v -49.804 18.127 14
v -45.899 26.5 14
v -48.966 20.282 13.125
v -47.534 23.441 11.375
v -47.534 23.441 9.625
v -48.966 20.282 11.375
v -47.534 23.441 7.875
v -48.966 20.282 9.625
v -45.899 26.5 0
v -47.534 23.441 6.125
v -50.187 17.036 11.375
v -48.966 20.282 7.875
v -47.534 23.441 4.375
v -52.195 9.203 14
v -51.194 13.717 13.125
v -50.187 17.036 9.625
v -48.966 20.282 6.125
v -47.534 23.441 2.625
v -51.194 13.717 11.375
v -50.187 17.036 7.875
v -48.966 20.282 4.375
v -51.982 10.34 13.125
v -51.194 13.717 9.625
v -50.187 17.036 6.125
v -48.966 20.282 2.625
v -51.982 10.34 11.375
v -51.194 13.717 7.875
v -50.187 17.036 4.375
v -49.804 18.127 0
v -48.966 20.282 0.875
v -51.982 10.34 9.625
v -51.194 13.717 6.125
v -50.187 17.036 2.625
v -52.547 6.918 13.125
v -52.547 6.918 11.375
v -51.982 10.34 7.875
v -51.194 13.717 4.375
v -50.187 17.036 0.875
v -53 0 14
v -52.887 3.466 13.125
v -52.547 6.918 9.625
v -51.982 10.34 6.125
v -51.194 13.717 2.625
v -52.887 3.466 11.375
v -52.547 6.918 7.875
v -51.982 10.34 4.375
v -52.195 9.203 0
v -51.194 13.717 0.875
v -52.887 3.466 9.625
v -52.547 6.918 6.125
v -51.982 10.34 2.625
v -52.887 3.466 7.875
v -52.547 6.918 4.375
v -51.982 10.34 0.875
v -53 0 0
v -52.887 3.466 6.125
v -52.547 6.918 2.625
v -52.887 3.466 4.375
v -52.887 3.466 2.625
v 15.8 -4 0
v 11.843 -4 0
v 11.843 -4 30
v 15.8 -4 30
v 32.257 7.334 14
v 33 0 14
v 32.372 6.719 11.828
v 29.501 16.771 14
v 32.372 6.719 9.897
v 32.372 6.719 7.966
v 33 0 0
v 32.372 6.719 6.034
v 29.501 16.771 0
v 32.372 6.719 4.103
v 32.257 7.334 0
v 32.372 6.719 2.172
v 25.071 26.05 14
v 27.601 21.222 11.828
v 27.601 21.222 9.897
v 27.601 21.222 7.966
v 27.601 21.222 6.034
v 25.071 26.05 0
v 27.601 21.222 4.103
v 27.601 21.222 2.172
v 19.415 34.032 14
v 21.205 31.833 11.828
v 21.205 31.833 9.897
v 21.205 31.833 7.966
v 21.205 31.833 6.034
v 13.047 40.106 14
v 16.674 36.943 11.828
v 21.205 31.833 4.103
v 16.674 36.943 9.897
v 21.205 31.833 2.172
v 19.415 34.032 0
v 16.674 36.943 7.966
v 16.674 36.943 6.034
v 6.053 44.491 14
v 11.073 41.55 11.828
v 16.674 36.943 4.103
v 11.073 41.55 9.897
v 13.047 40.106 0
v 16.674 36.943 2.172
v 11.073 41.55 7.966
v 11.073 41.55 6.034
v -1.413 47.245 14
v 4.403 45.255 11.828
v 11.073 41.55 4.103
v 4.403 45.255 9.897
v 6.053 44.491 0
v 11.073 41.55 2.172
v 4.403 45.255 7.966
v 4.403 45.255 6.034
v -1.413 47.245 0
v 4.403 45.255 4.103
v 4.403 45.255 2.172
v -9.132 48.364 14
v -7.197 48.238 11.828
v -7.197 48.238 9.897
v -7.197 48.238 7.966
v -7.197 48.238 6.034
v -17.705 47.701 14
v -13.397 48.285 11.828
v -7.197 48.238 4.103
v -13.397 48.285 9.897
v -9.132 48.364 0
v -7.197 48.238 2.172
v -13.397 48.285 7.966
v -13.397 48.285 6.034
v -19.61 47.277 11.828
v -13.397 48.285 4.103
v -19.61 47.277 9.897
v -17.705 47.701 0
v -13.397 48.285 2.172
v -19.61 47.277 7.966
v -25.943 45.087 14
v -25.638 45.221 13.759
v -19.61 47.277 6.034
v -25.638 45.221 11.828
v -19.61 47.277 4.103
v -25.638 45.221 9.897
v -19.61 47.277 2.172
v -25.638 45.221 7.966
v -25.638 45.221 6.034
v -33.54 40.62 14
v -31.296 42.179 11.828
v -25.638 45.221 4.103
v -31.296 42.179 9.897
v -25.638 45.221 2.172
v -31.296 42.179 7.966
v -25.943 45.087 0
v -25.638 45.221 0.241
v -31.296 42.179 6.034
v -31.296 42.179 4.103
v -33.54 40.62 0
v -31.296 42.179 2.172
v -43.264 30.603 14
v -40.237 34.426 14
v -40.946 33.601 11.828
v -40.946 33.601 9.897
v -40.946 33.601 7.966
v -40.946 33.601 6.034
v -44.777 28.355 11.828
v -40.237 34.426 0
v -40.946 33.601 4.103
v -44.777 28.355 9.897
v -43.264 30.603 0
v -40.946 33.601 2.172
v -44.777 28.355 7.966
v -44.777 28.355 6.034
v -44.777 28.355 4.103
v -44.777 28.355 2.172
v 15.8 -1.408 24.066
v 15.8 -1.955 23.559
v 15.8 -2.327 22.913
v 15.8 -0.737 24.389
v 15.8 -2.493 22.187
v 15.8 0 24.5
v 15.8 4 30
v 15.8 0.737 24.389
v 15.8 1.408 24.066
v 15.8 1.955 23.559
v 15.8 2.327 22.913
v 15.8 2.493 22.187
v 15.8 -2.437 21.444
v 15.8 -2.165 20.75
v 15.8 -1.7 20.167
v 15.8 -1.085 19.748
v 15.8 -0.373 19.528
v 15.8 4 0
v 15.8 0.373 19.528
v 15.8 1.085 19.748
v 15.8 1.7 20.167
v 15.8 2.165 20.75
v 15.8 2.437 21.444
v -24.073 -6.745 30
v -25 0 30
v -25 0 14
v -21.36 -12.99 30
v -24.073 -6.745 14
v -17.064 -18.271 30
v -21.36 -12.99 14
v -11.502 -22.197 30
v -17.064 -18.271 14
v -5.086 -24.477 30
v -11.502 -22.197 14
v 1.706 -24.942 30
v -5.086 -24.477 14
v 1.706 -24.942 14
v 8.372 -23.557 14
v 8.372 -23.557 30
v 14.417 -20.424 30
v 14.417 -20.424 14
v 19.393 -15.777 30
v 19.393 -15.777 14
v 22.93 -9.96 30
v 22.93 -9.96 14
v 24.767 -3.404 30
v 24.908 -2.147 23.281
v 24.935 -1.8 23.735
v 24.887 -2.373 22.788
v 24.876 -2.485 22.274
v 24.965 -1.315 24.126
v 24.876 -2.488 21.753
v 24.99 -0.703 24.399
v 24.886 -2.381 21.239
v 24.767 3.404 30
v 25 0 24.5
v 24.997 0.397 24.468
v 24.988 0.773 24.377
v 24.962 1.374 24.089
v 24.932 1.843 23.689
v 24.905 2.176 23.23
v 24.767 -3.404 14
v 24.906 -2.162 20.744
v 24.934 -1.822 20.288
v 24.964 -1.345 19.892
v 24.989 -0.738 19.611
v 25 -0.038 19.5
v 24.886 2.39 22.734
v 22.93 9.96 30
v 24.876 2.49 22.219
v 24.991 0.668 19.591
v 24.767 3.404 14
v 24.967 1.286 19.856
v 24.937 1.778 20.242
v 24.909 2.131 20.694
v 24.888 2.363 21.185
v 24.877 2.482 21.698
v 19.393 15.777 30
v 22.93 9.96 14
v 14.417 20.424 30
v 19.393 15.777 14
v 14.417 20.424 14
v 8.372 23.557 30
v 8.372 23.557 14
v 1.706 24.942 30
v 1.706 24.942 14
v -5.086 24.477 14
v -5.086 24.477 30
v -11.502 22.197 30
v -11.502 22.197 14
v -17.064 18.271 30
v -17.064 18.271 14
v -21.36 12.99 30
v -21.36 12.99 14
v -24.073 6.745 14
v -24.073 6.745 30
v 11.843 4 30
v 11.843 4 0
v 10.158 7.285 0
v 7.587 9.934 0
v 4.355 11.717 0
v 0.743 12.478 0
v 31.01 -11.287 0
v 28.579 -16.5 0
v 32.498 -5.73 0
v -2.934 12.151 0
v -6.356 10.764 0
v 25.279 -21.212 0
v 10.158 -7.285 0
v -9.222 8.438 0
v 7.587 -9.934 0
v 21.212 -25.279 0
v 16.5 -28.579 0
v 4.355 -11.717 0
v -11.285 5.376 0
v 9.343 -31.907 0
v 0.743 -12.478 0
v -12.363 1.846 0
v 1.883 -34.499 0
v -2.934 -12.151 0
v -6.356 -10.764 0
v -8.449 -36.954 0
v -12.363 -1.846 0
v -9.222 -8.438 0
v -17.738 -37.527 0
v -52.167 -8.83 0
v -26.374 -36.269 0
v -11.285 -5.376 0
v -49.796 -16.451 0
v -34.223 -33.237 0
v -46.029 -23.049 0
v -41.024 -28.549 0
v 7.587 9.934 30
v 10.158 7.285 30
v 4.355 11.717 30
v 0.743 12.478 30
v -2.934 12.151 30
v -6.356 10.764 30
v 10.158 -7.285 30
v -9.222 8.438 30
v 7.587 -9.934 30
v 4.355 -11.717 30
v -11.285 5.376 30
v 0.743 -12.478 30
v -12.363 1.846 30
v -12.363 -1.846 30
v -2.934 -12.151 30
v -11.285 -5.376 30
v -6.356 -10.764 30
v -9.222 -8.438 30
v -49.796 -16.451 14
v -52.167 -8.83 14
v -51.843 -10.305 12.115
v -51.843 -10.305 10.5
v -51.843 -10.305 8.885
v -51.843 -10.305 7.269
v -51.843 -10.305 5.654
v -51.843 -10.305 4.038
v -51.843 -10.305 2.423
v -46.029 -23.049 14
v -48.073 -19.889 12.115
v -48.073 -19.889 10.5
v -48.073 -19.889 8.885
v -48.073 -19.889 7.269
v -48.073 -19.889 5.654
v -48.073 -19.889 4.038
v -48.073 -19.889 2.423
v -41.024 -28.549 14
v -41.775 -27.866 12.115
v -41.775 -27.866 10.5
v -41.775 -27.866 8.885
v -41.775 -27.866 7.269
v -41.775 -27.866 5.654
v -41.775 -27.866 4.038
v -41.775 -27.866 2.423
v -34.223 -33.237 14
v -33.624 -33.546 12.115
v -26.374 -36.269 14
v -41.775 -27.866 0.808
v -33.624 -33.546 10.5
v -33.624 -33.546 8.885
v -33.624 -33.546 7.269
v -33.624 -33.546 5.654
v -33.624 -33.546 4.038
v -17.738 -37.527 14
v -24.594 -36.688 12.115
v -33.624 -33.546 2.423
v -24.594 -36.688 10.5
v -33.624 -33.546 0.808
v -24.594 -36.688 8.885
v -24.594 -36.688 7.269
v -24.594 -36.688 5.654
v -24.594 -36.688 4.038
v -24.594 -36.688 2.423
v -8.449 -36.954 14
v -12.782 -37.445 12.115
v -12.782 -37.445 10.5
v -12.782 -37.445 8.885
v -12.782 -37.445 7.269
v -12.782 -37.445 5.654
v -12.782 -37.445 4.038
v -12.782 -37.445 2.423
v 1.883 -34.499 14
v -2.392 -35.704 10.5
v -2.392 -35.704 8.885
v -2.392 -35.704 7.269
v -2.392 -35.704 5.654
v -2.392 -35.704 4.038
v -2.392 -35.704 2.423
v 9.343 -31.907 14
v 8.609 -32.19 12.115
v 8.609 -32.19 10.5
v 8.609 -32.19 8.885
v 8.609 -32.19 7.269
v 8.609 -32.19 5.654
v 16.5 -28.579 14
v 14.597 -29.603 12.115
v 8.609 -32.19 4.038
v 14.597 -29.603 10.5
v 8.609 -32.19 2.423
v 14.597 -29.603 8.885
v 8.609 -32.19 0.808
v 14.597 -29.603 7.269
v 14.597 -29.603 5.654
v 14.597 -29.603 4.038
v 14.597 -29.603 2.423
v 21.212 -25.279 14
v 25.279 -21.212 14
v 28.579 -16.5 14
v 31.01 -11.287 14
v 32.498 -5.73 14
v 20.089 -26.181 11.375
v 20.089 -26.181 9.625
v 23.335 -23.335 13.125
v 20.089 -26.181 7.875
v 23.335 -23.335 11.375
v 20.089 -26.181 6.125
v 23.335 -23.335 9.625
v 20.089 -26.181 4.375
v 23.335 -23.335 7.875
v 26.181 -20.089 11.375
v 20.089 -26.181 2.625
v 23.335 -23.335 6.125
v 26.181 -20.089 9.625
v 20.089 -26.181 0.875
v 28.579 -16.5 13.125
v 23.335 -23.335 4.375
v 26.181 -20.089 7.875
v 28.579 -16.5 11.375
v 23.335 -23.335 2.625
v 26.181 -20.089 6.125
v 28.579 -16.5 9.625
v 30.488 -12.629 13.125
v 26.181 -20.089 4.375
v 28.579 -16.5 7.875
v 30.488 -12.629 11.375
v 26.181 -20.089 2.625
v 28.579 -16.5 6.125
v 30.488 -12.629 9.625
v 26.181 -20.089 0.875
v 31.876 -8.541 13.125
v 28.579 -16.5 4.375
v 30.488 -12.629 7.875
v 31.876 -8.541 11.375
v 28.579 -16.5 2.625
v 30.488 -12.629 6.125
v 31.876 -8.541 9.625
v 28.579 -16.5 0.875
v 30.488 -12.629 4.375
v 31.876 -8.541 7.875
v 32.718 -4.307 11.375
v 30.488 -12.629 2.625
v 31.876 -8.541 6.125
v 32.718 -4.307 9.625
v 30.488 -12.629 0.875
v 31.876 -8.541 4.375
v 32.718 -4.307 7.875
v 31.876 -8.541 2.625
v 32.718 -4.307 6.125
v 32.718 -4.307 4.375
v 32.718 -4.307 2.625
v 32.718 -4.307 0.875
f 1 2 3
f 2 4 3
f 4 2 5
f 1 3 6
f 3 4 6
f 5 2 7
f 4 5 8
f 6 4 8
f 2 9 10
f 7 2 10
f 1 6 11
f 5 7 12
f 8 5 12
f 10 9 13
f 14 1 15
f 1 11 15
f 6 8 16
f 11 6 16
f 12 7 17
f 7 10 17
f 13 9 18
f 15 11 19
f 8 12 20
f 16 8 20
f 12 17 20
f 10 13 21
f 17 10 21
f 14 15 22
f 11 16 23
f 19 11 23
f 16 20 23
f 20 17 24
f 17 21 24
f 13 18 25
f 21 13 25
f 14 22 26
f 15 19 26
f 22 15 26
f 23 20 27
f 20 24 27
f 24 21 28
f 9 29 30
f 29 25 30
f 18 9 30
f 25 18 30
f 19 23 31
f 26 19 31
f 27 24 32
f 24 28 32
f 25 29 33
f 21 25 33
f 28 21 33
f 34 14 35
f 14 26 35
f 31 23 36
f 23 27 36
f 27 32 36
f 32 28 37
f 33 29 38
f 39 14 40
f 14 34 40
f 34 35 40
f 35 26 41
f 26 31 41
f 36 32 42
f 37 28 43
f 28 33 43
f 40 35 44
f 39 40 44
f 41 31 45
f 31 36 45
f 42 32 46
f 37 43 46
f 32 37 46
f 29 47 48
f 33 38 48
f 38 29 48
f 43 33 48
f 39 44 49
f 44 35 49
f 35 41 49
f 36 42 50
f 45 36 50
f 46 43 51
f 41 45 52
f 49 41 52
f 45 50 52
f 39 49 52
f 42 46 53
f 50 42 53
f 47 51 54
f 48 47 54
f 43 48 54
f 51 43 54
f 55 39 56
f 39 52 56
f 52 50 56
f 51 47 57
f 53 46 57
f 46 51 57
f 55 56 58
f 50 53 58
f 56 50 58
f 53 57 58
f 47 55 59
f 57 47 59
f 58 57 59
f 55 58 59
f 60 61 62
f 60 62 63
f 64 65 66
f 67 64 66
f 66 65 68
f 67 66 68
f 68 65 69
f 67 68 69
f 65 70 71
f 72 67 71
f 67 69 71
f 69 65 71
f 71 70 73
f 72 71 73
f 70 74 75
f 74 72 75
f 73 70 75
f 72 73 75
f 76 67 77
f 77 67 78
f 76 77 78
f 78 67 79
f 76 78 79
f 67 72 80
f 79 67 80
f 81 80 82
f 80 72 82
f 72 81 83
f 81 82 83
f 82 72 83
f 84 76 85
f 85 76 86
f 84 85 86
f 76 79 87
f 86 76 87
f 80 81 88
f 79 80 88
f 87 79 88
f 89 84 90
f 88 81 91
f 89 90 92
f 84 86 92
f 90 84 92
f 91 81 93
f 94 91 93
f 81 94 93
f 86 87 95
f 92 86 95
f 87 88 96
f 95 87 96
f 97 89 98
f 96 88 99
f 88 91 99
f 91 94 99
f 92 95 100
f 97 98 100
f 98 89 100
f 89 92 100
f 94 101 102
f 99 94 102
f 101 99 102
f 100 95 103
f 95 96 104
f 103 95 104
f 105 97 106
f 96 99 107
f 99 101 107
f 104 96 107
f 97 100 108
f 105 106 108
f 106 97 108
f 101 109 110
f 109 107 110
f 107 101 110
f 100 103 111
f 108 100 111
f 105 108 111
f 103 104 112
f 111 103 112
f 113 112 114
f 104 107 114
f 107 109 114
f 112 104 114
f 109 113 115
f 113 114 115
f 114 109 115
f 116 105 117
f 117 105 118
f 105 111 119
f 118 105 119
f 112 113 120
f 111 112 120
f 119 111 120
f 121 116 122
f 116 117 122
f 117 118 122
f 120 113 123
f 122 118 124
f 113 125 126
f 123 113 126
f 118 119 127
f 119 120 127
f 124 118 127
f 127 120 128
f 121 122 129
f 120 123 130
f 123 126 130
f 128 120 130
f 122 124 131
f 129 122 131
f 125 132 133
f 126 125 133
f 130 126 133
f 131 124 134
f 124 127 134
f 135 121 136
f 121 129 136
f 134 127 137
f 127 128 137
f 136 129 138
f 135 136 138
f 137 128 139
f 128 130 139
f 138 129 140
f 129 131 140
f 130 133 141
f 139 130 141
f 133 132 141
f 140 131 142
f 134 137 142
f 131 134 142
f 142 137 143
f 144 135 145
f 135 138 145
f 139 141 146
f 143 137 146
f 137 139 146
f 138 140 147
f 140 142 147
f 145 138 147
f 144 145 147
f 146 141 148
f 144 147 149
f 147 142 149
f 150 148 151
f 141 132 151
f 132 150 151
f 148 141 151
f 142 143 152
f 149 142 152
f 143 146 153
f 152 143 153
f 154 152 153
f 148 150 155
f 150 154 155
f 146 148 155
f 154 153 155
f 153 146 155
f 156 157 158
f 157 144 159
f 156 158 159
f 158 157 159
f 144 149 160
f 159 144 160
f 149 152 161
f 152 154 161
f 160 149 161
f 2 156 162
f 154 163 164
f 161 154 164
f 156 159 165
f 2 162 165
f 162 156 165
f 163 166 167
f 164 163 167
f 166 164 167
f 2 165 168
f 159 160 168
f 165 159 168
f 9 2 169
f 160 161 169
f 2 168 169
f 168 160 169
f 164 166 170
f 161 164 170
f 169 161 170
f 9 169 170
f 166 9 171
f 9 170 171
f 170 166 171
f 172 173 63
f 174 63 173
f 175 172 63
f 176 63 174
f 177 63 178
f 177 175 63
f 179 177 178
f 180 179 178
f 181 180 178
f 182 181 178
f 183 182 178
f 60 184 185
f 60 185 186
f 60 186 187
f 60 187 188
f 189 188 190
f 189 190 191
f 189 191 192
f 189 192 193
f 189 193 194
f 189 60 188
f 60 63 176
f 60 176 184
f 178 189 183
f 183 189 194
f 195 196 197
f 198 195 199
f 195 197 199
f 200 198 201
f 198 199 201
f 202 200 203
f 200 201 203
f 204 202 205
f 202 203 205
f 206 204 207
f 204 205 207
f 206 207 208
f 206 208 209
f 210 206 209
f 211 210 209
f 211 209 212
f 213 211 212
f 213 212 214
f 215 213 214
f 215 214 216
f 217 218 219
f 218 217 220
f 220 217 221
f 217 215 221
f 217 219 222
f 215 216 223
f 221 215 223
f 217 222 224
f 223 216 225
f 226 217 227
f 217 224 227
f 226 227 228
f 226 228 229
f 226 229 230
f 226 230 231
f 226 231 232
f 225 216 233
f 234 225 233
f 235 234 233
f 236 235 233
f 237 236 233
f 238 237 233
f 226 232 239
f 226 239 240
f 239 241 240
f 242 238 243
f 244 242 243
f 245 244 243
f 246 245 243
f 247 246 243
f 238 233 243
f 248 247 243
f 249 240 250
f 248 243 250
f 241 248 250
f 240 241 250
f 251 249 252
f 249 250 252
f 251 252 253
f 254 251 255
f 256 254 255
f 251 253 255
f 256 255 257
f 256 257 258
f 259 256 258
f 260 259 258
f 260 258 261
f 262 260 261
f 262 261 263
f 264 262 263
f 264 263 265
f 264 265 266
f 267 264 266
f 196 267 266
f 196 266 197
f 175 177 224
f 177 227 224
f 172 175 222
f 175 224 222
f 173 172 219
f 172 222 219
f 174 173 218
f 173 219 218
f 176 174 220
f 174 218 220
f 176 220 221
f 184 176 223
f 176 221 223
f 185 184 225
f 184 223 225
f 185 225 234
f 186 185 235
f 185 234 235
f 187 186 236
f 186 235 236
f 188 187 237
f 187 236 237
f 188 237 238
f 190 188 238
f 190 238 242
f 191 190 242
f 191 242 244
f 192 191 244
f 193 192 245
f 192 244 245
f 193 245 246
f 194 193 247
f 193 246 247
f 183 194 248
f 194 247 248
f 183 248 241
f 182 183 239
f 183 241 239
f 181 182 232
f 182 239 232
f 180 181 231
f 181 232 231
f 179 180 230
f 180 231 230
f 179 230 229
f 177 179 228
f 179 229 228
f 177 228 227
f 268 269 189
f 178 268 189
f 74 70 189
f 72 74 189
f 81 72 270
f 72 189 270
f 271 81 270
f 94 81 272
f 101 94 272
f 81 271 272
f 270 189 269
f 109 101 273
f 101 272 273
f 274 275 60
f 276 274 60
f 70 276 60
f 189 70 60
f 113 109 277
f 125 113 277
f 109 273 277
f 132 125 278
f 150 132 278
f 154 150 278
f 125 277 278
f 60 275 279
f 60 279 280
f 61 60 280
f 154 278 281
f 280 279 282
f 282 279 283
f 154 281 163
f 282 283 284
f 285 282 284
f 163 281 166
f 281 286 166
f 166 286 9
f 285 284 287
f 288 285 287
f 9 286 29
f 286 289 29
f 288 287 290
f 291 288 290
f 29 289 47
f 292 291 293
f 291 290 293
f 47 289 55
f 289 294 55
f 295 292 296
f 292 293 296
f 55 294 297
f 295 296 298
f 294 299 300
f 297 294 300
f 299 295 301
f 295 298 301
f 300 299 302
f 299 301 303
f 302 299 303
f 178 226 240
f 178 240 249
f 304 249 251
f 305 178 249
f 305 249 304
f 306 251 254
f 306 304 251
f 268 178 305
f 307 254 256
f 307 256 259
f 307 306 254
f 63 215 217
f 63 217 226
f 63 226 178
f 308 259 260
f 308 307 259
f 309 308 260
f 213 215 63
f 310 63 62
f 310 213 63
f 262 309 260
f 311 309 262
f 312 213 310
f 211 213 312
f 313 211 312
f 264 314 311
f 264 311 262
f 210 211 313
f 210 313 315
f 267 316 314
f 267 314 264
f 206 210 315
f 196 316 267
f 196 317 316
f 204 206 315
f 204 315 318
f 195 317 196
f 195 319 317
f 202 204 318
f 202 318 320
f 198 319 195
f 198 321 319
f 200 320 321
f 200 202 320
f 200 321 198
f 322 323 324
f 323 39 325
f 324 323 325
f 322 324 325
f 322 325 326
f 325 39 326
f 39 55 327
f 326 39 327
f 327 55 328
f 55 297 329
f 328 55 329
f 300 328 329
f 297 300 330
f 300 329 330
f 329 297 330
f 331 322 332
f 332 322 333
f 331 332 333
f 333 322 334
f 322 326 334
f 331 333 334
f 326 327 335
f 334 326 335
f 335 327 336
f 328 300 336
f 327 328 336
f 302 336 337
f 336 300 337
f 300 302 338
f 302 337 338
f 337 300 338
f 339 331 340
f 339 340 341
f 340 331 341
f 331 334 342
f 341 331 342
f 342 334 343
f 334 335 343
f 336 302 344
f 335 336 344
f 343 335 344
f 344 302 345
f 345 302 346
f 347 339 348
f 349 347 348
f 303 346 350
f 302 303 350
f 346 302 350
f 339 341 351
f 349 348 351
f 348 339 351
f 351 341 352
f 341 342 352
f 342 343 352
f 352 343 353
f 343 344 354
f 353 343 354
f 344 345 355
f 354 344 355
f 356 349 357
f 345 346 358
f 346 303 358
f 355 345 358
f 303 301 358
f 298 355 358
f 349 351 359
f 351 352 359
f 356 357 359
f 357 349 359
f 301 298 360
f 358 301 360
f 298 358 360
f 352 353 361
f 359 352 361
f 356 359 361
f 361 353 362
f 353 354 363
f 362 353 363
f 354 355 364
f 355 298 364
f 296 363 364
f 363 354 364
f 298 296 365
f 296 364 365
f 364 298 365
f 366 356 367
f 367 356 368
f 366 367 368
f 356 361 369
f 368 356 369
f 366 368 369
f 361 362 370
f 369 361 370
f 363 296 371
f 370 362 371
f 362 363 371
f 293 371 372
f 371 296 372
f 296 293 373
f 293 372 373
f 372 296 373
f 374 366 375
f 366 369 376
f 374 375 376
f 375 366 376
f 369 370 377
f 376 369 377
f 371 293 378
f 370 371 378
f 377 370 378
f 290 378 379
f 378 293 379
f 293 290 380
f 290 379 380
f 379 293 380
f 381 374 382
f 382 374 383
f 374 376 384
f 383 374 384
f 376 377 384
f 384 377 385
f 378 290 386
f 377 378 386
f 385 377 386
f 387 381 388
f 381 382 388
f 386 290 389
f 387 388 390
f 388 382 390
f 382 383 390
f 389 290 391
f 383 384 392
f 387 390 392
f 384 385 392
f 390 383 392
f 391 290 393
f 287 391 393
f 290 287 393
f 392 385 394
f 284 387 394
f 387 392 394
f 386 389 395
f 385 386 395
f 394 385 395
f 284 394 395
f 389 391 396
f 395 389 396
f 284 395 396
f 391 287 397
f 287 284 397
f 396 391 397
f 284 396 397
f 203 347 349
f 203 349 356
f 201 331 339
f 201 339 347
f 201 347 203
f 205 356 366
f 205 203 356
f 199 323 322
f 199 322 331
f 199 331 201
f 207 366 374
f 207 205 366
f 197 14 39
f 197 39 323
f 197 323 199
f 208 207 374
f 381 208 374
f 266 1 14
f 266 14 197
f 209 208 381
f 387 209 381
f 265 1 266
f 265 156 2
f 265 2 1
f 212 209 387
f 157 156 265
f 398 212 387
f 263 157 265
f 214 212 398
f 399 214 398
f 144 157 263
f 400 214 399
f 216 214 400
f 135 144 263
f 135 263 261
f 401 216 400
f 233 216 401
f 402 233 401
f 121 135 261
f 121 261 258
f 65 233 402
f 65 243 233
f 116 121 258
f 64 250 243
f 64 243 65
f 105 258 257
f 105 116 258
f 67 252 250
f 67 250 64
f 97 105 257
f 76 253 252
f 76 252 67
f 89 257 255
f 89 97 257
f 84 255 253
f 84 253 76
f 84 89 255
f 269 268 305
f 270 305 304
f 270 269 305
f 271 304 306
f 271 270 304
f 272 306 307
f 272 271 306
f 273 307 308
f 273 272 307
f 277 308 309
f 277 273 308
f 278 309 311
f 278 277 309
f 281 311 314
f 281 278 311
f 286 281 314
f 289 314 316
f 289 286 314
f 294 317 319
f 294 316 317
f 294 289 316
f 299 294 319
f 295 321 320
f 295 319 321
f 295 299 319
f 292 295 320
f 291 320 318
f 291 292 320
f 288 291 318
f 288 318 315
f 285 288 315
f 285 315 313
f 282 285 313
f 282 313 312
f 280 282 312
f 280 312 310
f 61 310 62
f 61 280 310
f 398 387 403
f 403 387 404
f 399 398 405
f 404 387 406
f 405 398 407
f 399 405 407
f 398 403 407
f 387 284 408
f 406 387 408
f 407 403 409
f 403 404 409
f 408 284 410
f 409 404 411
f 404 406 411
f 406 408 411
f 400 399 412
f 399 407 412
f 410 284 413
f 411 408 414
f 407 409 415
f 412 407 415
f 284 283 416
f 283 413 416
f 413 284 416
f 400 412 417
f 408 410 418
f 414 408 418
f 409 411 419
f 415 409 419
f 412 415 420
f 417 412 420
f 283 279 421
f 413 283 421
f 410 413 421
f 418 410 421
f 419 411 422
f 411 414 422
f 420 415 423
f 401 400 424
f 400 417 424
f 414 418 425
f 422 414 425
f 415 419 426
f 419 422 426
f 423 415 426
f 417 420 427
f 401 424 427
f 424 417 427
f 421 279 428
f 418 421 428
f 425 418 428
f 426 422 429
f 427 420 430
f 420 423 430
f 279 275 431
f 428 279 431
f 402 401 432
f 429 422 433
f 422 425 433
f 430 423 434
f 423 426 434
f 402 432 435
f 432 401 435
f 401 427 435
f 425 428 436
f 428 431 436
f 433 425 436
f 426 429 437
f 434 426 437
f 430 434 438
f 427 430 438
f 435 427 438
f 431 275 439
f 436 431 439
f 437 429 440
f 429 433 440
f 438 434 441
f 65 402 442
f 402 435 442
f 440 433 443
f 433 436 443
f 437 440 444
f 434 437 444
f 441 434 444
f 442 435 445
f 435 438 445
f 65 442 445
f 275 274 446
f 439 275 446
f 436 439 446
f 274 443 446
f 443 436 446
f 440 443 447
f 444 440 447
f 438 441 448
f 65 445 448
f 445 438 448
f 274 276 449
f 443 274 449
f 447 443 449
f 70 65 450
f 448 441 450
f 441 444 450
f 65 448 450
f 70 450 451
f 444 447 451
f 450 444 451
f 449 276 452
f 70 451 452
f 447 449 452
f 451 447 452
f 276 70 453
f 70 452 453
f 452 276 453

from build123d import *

# Parameters (mm, degrees)
EXTRUDE_1_DEPTH     = 14
SKETCH_2_R          = 25
EXTRUDE_2_DEPTH     = 30
SKETCH_3_R          = 12.5
CUT_EXTRUDE_1_DEPTH = 78.786850529
SKETCH_4_W          = 15.8
SKETCH_4_H          = 8
CUT_EXTRUDE_2_DEPTH = 78.786850529
SWEEP_2_PROFILE_R   = 2.5


with BuildPart() as part:
    # 草图1 → 凸台-拉伸1 (new body)
    with BuildSketch(Plane.XY):
        with BuildLine():
            add(Edge.make_bspline(
                [(33, 0), (32.994684587, 0.450024215), (32.984052078, 1.350215217), (32.901076258, 2.698653645), (32.772860205, 4.043927251), (32.597324571, 5.384974816), (32.378634546, 6.721198171), (32.032078752, 8.498284254), (31.501703341, 10.710471336), (30.726699331, 13.347427223), (29.820422985, 15.978337375), (28.78376894, 18.611676644), (27.610273888, 21.254339279), (26.515182854, 23.45103287), (25.5574803, 25.211343802), (24.789016632, 26.54270045), (23.972675772, 27.874149931), (23.105472148, 29.203671357), (22.184421782, 30.528688408), (21.206602984, 31.846069432), (20.16924743, 33.152137052), (19.069811985, 34.442677822), (17.90606236, 35.712977232), (16.676140858, 36.957852112), (15.37863945, 38.17170453), (14.012657383, 39.348574759), (12.57785829, 40.48221221), (11.07450942, 41.566141858), (9.503524234, 42.593753741), (7.866477955, 43.558375054), (6.165627296, 44.453366408), (4.403908588, 45.272204934), (2.584926869, 46.008571066), (0.712936618, 46.656438122), (-1.207193797, 47.210150802), (-3.170021946, 47.66451179), (-5.169590122, 48.014834863), (-7.19948183, 48.257032362), (-9.252895705, 48.387650153), (-11.322721226, 48.403921527), (-13.401619953, 48.303802916), (-15.482112157, 48.085992666), (-17.556663385, 47.74994839), (-19.617771107, 47.295872816), (-21.658056561, 46.724726957), (-23.670342116, 46.038176688), (-25.647738102, 45.238585056), (-27.583709079, 44.328944976), (-29.472149374, 43.312844419), (-31.307433374, 42.194386964), (-33.084472119, 40.978136682), (-34.798745182, 39.669031546), (-36.446339426, 38.272314352), (-38.023943914, 36.793434836), (-39.528922958, 35.238009279), (-40.959078807, 33.611599403), (-42.313460643, 31.920114124), (-43.589311507, 30.167983471), (-44.793272704, 28.364572965), (-45.530637058, 27.121554401), (-45.899346, 26.5)],
                knots=[0, 0, 0, 0, 0.011720528, 0.02344477, 0.035174471, 0.046912746, 0.058664172, 0.070434849, 0.094064277, 0.117883715, 0.141995125, 0.166516265, 0.191571891, 0.217283663, 0.230421312, 0.243762401, 0.257317187, 0.271094269, 0.285100438, 0.299340704, 0.313818209, 0.328534322, 0.343488665, 0.358679258, 0.374102619, 0.38975391, 0.405627105, 0.421715168, 0.438010208, 0.454503662, 0.471186473, 0.488049229, 0.505082314, 0.522276079, 0.539620899, 0.557107331, 0.574726161, 0.592468467, 0.610325686, 0.6282896, 0.646352393, 0.664506599, 0.682745118, 0.701061152, 0.719448204, 0.737900044, 0.756410636, 0.774974145, 0.7935849, 0.812237383, 0.830926227, 0.84964623, 0.86839239, 0.887159977, 0.90594454, 0.924742047, 0.943548942, 0.962362269, 0.981179768, 1, 1, 1, 1], degree=3))
            add(Edge.make_bspline(
                [(-45.899346, 26.5), (-46.183686014, 25.99658476), (-46.752365912, 24.989754507), (-47.542151603, 23.44514535), (-48.284558357, 21.877468697), (-48.974312895, 20.285818041), (-49.611879734, 18.672591924), (-50.196252541, 17.039331265), (-50.726892215, 15.387834686), (-51.203206677, 13.719857757), (-51.62469458, 12.037190136), (-51.990895237, 10.341632673), (-52.301444487, 8.635001114), (-52.555908827, 6.919122788), (-52.754388224, 5.195835615), (-52.895284113, 3.466984365), (-52.98361346, 1.734420848), (-52.994537821, 0.578140181), (-53, 0)],
                knots=[0, 0, 0, 0, 0.062500008, 0.124999987, 0.187499996, 0.249999999, 0.312499987, 0.374999994, 0.437500002, 0.500000019, 0.562500001, 0.625000006, 0.687500007, 0.75000001, 0.812500019, 0.874999996, 0.937500015, 1, 1, 1, 1], degree=3))
            add(Edge.make_bspline(
                [(-53, 0), (-52.994536306, -0.578068365), (-52.983610487, -1.734039205), (-52.890921769, -3.465687653), (-52.737459804, -5.192153917), (-52.514830205, -6.910368406), (-52.221750153, -8.616869483), (-51.855756316, -10.30788244), (-51.415431279, -11.979386603), (-50.899814435, -13.627185589), (-50.308555585, -15.246972675), (-49.641851525, -16.834390924), (-48.90046009, -18.385099751), (-48.085659908, -19.894826006), (-47.199233749, -21.359419817), (-46.243441559, -22.77490659), (-45.220979977, -24.137526422), (-44.134954865, -25.443781463), (-42.988839739, -26.690470176), (-41.786431369, -27.874717783), (-40.531812023, -28.994003994), (-39.22930277, -30.046187837), (-37.883420895, -31.029524247), (-36.498828408, -31.94267376), (-35.08029367, -32.784716601), (-33.632637068, -33.55514713), (-32.160696249, -34.253885921), (-30.669272011, -34.881258756), (-29.163092884, -35.437998224), (-27.646770009, -35.925222878), (-26.124761473, -36.344421792), (-24.601335518, -36.69743659), (-23.080535449, -36.986424819), (-21.566151621, -37.21384479), (-20.06169318, -37.382416012), (-18.570364754, -37.495089115), (-17.09504745, -37.555010185), (-15.63828303, -37.565478254), (-14.202260945, -37.529911258), (-12.788815604, -37.451808758), (-11.399408098, -37.334697574), (-9.594924838, -37.132882108), (-7.403548822, -36.80259903), (-4.857653491, -36.301470095), (-2.413691345, -35.722805964), (-0.064581352, -35.086952206), (2.19985327, -34.409599534), (4.391499881, -33.700962662), (6.522577444, -32.965335838), (8.60383086, -32.200414937), (10.643647529, -31.398673827), (12.643577343, -30.542836156), (14.606977568, -29.624742426), (15.869373093, -28.927262542), (16.5, -28.578838)],
                knots=[0, 0, 0, 0, 0.018617485, 0.037229627, 0.055835032, 0.074431523, 0.093016392, 0.111586604, 0.130138962, 0.148670157, 0.167176824, 0.185655535, 0.204102805, 0.22251502, 0.240888411, 0.259219008, 0.277502562, 0.295734481, 0.313909833, 0.332023234, 0.350068877, 0.368040428, 0.385931136, 0.403733696, 0.421440373, 0.439042968, 0.456532892, 0.473901167, 0.491138559, 0.508235601, 0.525182699, 0.541970207, 0.558588573, 0.575028394, 0.591280583, 0.607336484, 0.623187988, 0.638827665, 0.654248924, 0.669446162, 0.68441483, 0.699151658, 0.727921526, 0.755761391, 0.782700659, 0.808796619, 0.834133633, 0.858819493, 0.882978406, 0.906741052, 0.93023242, 0.953559502, 0.976800752, 1, 1, 1, 1], degree=3))
            add(Edge.make_bspline(
                [(16.5, -28.578838), (17.116689929, -28.207079649), (18.350069625, -27.463563045), (20.10262845, -26.197892511), (21.774178875, -24.828826667), (23.35112871, -23.351084244), (24.828450291, -21.773980361), (26.19935355, -20.10346697), (27.458095264, -18.346914058), (28.599248007, -16.511783882), (29.617940435, -14.605950878), (30.509791163, -12.637572777), (31.27104422, -10.615077714), (31.898195971, -8.547128331), (32.389483458, -6.442578551), (32.739354772, -4.310440562), (32.959177295, -2.15984452), (32.986392432, -0.719948155), (33, 0)],
                knots=[0, 0, 0, 0, 0.062500006, 0.124999996, 0.187499992, 0.249999998, 0.312500003, 0.374999999, 0.437499989, 0.499999995, 0.562499988, 0.625000012, 0.687500008, 0.750000012, 0.812499988, 0.875000009, 0.937500007, 1, 1, 1, 1], degree=3))
        make_face()
    extrude(amount=EXTRUDE_1_DEPTH)

    # 草图2 → 凸台-拉伸2 (add)
    with BuildSketch(Plane.XY):
        with Locations(Location((0, 0, 0), (0, 0, 180))):
            Circle(SKETCH_2_R)
    extrude(amount=EXTRUDE_2_DEPTH)

    # 草图3 → 切除-拉伸1 (cut, through all)
    with BuildSketch(Plane.XY):
        Circle(SKETCH_3_R)
    extrude(amount=CUT_EXTRUDE_1_DEPTH, mode=Mode.SUBTRACT)

    # 草图4 → 切除-拉伸2 (cut, through all)
    with BuildSketch(Plane.XY):
        with Locations((7.9, 0)):
            Rectangle(SKETCH_4_W, SKETCH_4_H)
    extrude(amount=CUT_EXTRUDE_2_DEPTH, mode=Mode.SUBTRACT)

    # 切除-扫描2: sweep along a curve in space
    with BuildLine() as sweep_2_path:
        Line((-1, 0, 22), (26, 0, 22))
    # 切除-扫描2 profile (on start of the path) → 切除-扫描2 (sweep, cut)
    with BuildSketch(Plane(origin=(-1, 0, 22), x_dir=(0, 0, 1), z_dir=(1, 0, 0))):
        Circle(SWEEP_2_PROFILE_R)
    sweep(path=sweep_2_path.line, mode=Mode.SUBTRACT)


solid = part.part
